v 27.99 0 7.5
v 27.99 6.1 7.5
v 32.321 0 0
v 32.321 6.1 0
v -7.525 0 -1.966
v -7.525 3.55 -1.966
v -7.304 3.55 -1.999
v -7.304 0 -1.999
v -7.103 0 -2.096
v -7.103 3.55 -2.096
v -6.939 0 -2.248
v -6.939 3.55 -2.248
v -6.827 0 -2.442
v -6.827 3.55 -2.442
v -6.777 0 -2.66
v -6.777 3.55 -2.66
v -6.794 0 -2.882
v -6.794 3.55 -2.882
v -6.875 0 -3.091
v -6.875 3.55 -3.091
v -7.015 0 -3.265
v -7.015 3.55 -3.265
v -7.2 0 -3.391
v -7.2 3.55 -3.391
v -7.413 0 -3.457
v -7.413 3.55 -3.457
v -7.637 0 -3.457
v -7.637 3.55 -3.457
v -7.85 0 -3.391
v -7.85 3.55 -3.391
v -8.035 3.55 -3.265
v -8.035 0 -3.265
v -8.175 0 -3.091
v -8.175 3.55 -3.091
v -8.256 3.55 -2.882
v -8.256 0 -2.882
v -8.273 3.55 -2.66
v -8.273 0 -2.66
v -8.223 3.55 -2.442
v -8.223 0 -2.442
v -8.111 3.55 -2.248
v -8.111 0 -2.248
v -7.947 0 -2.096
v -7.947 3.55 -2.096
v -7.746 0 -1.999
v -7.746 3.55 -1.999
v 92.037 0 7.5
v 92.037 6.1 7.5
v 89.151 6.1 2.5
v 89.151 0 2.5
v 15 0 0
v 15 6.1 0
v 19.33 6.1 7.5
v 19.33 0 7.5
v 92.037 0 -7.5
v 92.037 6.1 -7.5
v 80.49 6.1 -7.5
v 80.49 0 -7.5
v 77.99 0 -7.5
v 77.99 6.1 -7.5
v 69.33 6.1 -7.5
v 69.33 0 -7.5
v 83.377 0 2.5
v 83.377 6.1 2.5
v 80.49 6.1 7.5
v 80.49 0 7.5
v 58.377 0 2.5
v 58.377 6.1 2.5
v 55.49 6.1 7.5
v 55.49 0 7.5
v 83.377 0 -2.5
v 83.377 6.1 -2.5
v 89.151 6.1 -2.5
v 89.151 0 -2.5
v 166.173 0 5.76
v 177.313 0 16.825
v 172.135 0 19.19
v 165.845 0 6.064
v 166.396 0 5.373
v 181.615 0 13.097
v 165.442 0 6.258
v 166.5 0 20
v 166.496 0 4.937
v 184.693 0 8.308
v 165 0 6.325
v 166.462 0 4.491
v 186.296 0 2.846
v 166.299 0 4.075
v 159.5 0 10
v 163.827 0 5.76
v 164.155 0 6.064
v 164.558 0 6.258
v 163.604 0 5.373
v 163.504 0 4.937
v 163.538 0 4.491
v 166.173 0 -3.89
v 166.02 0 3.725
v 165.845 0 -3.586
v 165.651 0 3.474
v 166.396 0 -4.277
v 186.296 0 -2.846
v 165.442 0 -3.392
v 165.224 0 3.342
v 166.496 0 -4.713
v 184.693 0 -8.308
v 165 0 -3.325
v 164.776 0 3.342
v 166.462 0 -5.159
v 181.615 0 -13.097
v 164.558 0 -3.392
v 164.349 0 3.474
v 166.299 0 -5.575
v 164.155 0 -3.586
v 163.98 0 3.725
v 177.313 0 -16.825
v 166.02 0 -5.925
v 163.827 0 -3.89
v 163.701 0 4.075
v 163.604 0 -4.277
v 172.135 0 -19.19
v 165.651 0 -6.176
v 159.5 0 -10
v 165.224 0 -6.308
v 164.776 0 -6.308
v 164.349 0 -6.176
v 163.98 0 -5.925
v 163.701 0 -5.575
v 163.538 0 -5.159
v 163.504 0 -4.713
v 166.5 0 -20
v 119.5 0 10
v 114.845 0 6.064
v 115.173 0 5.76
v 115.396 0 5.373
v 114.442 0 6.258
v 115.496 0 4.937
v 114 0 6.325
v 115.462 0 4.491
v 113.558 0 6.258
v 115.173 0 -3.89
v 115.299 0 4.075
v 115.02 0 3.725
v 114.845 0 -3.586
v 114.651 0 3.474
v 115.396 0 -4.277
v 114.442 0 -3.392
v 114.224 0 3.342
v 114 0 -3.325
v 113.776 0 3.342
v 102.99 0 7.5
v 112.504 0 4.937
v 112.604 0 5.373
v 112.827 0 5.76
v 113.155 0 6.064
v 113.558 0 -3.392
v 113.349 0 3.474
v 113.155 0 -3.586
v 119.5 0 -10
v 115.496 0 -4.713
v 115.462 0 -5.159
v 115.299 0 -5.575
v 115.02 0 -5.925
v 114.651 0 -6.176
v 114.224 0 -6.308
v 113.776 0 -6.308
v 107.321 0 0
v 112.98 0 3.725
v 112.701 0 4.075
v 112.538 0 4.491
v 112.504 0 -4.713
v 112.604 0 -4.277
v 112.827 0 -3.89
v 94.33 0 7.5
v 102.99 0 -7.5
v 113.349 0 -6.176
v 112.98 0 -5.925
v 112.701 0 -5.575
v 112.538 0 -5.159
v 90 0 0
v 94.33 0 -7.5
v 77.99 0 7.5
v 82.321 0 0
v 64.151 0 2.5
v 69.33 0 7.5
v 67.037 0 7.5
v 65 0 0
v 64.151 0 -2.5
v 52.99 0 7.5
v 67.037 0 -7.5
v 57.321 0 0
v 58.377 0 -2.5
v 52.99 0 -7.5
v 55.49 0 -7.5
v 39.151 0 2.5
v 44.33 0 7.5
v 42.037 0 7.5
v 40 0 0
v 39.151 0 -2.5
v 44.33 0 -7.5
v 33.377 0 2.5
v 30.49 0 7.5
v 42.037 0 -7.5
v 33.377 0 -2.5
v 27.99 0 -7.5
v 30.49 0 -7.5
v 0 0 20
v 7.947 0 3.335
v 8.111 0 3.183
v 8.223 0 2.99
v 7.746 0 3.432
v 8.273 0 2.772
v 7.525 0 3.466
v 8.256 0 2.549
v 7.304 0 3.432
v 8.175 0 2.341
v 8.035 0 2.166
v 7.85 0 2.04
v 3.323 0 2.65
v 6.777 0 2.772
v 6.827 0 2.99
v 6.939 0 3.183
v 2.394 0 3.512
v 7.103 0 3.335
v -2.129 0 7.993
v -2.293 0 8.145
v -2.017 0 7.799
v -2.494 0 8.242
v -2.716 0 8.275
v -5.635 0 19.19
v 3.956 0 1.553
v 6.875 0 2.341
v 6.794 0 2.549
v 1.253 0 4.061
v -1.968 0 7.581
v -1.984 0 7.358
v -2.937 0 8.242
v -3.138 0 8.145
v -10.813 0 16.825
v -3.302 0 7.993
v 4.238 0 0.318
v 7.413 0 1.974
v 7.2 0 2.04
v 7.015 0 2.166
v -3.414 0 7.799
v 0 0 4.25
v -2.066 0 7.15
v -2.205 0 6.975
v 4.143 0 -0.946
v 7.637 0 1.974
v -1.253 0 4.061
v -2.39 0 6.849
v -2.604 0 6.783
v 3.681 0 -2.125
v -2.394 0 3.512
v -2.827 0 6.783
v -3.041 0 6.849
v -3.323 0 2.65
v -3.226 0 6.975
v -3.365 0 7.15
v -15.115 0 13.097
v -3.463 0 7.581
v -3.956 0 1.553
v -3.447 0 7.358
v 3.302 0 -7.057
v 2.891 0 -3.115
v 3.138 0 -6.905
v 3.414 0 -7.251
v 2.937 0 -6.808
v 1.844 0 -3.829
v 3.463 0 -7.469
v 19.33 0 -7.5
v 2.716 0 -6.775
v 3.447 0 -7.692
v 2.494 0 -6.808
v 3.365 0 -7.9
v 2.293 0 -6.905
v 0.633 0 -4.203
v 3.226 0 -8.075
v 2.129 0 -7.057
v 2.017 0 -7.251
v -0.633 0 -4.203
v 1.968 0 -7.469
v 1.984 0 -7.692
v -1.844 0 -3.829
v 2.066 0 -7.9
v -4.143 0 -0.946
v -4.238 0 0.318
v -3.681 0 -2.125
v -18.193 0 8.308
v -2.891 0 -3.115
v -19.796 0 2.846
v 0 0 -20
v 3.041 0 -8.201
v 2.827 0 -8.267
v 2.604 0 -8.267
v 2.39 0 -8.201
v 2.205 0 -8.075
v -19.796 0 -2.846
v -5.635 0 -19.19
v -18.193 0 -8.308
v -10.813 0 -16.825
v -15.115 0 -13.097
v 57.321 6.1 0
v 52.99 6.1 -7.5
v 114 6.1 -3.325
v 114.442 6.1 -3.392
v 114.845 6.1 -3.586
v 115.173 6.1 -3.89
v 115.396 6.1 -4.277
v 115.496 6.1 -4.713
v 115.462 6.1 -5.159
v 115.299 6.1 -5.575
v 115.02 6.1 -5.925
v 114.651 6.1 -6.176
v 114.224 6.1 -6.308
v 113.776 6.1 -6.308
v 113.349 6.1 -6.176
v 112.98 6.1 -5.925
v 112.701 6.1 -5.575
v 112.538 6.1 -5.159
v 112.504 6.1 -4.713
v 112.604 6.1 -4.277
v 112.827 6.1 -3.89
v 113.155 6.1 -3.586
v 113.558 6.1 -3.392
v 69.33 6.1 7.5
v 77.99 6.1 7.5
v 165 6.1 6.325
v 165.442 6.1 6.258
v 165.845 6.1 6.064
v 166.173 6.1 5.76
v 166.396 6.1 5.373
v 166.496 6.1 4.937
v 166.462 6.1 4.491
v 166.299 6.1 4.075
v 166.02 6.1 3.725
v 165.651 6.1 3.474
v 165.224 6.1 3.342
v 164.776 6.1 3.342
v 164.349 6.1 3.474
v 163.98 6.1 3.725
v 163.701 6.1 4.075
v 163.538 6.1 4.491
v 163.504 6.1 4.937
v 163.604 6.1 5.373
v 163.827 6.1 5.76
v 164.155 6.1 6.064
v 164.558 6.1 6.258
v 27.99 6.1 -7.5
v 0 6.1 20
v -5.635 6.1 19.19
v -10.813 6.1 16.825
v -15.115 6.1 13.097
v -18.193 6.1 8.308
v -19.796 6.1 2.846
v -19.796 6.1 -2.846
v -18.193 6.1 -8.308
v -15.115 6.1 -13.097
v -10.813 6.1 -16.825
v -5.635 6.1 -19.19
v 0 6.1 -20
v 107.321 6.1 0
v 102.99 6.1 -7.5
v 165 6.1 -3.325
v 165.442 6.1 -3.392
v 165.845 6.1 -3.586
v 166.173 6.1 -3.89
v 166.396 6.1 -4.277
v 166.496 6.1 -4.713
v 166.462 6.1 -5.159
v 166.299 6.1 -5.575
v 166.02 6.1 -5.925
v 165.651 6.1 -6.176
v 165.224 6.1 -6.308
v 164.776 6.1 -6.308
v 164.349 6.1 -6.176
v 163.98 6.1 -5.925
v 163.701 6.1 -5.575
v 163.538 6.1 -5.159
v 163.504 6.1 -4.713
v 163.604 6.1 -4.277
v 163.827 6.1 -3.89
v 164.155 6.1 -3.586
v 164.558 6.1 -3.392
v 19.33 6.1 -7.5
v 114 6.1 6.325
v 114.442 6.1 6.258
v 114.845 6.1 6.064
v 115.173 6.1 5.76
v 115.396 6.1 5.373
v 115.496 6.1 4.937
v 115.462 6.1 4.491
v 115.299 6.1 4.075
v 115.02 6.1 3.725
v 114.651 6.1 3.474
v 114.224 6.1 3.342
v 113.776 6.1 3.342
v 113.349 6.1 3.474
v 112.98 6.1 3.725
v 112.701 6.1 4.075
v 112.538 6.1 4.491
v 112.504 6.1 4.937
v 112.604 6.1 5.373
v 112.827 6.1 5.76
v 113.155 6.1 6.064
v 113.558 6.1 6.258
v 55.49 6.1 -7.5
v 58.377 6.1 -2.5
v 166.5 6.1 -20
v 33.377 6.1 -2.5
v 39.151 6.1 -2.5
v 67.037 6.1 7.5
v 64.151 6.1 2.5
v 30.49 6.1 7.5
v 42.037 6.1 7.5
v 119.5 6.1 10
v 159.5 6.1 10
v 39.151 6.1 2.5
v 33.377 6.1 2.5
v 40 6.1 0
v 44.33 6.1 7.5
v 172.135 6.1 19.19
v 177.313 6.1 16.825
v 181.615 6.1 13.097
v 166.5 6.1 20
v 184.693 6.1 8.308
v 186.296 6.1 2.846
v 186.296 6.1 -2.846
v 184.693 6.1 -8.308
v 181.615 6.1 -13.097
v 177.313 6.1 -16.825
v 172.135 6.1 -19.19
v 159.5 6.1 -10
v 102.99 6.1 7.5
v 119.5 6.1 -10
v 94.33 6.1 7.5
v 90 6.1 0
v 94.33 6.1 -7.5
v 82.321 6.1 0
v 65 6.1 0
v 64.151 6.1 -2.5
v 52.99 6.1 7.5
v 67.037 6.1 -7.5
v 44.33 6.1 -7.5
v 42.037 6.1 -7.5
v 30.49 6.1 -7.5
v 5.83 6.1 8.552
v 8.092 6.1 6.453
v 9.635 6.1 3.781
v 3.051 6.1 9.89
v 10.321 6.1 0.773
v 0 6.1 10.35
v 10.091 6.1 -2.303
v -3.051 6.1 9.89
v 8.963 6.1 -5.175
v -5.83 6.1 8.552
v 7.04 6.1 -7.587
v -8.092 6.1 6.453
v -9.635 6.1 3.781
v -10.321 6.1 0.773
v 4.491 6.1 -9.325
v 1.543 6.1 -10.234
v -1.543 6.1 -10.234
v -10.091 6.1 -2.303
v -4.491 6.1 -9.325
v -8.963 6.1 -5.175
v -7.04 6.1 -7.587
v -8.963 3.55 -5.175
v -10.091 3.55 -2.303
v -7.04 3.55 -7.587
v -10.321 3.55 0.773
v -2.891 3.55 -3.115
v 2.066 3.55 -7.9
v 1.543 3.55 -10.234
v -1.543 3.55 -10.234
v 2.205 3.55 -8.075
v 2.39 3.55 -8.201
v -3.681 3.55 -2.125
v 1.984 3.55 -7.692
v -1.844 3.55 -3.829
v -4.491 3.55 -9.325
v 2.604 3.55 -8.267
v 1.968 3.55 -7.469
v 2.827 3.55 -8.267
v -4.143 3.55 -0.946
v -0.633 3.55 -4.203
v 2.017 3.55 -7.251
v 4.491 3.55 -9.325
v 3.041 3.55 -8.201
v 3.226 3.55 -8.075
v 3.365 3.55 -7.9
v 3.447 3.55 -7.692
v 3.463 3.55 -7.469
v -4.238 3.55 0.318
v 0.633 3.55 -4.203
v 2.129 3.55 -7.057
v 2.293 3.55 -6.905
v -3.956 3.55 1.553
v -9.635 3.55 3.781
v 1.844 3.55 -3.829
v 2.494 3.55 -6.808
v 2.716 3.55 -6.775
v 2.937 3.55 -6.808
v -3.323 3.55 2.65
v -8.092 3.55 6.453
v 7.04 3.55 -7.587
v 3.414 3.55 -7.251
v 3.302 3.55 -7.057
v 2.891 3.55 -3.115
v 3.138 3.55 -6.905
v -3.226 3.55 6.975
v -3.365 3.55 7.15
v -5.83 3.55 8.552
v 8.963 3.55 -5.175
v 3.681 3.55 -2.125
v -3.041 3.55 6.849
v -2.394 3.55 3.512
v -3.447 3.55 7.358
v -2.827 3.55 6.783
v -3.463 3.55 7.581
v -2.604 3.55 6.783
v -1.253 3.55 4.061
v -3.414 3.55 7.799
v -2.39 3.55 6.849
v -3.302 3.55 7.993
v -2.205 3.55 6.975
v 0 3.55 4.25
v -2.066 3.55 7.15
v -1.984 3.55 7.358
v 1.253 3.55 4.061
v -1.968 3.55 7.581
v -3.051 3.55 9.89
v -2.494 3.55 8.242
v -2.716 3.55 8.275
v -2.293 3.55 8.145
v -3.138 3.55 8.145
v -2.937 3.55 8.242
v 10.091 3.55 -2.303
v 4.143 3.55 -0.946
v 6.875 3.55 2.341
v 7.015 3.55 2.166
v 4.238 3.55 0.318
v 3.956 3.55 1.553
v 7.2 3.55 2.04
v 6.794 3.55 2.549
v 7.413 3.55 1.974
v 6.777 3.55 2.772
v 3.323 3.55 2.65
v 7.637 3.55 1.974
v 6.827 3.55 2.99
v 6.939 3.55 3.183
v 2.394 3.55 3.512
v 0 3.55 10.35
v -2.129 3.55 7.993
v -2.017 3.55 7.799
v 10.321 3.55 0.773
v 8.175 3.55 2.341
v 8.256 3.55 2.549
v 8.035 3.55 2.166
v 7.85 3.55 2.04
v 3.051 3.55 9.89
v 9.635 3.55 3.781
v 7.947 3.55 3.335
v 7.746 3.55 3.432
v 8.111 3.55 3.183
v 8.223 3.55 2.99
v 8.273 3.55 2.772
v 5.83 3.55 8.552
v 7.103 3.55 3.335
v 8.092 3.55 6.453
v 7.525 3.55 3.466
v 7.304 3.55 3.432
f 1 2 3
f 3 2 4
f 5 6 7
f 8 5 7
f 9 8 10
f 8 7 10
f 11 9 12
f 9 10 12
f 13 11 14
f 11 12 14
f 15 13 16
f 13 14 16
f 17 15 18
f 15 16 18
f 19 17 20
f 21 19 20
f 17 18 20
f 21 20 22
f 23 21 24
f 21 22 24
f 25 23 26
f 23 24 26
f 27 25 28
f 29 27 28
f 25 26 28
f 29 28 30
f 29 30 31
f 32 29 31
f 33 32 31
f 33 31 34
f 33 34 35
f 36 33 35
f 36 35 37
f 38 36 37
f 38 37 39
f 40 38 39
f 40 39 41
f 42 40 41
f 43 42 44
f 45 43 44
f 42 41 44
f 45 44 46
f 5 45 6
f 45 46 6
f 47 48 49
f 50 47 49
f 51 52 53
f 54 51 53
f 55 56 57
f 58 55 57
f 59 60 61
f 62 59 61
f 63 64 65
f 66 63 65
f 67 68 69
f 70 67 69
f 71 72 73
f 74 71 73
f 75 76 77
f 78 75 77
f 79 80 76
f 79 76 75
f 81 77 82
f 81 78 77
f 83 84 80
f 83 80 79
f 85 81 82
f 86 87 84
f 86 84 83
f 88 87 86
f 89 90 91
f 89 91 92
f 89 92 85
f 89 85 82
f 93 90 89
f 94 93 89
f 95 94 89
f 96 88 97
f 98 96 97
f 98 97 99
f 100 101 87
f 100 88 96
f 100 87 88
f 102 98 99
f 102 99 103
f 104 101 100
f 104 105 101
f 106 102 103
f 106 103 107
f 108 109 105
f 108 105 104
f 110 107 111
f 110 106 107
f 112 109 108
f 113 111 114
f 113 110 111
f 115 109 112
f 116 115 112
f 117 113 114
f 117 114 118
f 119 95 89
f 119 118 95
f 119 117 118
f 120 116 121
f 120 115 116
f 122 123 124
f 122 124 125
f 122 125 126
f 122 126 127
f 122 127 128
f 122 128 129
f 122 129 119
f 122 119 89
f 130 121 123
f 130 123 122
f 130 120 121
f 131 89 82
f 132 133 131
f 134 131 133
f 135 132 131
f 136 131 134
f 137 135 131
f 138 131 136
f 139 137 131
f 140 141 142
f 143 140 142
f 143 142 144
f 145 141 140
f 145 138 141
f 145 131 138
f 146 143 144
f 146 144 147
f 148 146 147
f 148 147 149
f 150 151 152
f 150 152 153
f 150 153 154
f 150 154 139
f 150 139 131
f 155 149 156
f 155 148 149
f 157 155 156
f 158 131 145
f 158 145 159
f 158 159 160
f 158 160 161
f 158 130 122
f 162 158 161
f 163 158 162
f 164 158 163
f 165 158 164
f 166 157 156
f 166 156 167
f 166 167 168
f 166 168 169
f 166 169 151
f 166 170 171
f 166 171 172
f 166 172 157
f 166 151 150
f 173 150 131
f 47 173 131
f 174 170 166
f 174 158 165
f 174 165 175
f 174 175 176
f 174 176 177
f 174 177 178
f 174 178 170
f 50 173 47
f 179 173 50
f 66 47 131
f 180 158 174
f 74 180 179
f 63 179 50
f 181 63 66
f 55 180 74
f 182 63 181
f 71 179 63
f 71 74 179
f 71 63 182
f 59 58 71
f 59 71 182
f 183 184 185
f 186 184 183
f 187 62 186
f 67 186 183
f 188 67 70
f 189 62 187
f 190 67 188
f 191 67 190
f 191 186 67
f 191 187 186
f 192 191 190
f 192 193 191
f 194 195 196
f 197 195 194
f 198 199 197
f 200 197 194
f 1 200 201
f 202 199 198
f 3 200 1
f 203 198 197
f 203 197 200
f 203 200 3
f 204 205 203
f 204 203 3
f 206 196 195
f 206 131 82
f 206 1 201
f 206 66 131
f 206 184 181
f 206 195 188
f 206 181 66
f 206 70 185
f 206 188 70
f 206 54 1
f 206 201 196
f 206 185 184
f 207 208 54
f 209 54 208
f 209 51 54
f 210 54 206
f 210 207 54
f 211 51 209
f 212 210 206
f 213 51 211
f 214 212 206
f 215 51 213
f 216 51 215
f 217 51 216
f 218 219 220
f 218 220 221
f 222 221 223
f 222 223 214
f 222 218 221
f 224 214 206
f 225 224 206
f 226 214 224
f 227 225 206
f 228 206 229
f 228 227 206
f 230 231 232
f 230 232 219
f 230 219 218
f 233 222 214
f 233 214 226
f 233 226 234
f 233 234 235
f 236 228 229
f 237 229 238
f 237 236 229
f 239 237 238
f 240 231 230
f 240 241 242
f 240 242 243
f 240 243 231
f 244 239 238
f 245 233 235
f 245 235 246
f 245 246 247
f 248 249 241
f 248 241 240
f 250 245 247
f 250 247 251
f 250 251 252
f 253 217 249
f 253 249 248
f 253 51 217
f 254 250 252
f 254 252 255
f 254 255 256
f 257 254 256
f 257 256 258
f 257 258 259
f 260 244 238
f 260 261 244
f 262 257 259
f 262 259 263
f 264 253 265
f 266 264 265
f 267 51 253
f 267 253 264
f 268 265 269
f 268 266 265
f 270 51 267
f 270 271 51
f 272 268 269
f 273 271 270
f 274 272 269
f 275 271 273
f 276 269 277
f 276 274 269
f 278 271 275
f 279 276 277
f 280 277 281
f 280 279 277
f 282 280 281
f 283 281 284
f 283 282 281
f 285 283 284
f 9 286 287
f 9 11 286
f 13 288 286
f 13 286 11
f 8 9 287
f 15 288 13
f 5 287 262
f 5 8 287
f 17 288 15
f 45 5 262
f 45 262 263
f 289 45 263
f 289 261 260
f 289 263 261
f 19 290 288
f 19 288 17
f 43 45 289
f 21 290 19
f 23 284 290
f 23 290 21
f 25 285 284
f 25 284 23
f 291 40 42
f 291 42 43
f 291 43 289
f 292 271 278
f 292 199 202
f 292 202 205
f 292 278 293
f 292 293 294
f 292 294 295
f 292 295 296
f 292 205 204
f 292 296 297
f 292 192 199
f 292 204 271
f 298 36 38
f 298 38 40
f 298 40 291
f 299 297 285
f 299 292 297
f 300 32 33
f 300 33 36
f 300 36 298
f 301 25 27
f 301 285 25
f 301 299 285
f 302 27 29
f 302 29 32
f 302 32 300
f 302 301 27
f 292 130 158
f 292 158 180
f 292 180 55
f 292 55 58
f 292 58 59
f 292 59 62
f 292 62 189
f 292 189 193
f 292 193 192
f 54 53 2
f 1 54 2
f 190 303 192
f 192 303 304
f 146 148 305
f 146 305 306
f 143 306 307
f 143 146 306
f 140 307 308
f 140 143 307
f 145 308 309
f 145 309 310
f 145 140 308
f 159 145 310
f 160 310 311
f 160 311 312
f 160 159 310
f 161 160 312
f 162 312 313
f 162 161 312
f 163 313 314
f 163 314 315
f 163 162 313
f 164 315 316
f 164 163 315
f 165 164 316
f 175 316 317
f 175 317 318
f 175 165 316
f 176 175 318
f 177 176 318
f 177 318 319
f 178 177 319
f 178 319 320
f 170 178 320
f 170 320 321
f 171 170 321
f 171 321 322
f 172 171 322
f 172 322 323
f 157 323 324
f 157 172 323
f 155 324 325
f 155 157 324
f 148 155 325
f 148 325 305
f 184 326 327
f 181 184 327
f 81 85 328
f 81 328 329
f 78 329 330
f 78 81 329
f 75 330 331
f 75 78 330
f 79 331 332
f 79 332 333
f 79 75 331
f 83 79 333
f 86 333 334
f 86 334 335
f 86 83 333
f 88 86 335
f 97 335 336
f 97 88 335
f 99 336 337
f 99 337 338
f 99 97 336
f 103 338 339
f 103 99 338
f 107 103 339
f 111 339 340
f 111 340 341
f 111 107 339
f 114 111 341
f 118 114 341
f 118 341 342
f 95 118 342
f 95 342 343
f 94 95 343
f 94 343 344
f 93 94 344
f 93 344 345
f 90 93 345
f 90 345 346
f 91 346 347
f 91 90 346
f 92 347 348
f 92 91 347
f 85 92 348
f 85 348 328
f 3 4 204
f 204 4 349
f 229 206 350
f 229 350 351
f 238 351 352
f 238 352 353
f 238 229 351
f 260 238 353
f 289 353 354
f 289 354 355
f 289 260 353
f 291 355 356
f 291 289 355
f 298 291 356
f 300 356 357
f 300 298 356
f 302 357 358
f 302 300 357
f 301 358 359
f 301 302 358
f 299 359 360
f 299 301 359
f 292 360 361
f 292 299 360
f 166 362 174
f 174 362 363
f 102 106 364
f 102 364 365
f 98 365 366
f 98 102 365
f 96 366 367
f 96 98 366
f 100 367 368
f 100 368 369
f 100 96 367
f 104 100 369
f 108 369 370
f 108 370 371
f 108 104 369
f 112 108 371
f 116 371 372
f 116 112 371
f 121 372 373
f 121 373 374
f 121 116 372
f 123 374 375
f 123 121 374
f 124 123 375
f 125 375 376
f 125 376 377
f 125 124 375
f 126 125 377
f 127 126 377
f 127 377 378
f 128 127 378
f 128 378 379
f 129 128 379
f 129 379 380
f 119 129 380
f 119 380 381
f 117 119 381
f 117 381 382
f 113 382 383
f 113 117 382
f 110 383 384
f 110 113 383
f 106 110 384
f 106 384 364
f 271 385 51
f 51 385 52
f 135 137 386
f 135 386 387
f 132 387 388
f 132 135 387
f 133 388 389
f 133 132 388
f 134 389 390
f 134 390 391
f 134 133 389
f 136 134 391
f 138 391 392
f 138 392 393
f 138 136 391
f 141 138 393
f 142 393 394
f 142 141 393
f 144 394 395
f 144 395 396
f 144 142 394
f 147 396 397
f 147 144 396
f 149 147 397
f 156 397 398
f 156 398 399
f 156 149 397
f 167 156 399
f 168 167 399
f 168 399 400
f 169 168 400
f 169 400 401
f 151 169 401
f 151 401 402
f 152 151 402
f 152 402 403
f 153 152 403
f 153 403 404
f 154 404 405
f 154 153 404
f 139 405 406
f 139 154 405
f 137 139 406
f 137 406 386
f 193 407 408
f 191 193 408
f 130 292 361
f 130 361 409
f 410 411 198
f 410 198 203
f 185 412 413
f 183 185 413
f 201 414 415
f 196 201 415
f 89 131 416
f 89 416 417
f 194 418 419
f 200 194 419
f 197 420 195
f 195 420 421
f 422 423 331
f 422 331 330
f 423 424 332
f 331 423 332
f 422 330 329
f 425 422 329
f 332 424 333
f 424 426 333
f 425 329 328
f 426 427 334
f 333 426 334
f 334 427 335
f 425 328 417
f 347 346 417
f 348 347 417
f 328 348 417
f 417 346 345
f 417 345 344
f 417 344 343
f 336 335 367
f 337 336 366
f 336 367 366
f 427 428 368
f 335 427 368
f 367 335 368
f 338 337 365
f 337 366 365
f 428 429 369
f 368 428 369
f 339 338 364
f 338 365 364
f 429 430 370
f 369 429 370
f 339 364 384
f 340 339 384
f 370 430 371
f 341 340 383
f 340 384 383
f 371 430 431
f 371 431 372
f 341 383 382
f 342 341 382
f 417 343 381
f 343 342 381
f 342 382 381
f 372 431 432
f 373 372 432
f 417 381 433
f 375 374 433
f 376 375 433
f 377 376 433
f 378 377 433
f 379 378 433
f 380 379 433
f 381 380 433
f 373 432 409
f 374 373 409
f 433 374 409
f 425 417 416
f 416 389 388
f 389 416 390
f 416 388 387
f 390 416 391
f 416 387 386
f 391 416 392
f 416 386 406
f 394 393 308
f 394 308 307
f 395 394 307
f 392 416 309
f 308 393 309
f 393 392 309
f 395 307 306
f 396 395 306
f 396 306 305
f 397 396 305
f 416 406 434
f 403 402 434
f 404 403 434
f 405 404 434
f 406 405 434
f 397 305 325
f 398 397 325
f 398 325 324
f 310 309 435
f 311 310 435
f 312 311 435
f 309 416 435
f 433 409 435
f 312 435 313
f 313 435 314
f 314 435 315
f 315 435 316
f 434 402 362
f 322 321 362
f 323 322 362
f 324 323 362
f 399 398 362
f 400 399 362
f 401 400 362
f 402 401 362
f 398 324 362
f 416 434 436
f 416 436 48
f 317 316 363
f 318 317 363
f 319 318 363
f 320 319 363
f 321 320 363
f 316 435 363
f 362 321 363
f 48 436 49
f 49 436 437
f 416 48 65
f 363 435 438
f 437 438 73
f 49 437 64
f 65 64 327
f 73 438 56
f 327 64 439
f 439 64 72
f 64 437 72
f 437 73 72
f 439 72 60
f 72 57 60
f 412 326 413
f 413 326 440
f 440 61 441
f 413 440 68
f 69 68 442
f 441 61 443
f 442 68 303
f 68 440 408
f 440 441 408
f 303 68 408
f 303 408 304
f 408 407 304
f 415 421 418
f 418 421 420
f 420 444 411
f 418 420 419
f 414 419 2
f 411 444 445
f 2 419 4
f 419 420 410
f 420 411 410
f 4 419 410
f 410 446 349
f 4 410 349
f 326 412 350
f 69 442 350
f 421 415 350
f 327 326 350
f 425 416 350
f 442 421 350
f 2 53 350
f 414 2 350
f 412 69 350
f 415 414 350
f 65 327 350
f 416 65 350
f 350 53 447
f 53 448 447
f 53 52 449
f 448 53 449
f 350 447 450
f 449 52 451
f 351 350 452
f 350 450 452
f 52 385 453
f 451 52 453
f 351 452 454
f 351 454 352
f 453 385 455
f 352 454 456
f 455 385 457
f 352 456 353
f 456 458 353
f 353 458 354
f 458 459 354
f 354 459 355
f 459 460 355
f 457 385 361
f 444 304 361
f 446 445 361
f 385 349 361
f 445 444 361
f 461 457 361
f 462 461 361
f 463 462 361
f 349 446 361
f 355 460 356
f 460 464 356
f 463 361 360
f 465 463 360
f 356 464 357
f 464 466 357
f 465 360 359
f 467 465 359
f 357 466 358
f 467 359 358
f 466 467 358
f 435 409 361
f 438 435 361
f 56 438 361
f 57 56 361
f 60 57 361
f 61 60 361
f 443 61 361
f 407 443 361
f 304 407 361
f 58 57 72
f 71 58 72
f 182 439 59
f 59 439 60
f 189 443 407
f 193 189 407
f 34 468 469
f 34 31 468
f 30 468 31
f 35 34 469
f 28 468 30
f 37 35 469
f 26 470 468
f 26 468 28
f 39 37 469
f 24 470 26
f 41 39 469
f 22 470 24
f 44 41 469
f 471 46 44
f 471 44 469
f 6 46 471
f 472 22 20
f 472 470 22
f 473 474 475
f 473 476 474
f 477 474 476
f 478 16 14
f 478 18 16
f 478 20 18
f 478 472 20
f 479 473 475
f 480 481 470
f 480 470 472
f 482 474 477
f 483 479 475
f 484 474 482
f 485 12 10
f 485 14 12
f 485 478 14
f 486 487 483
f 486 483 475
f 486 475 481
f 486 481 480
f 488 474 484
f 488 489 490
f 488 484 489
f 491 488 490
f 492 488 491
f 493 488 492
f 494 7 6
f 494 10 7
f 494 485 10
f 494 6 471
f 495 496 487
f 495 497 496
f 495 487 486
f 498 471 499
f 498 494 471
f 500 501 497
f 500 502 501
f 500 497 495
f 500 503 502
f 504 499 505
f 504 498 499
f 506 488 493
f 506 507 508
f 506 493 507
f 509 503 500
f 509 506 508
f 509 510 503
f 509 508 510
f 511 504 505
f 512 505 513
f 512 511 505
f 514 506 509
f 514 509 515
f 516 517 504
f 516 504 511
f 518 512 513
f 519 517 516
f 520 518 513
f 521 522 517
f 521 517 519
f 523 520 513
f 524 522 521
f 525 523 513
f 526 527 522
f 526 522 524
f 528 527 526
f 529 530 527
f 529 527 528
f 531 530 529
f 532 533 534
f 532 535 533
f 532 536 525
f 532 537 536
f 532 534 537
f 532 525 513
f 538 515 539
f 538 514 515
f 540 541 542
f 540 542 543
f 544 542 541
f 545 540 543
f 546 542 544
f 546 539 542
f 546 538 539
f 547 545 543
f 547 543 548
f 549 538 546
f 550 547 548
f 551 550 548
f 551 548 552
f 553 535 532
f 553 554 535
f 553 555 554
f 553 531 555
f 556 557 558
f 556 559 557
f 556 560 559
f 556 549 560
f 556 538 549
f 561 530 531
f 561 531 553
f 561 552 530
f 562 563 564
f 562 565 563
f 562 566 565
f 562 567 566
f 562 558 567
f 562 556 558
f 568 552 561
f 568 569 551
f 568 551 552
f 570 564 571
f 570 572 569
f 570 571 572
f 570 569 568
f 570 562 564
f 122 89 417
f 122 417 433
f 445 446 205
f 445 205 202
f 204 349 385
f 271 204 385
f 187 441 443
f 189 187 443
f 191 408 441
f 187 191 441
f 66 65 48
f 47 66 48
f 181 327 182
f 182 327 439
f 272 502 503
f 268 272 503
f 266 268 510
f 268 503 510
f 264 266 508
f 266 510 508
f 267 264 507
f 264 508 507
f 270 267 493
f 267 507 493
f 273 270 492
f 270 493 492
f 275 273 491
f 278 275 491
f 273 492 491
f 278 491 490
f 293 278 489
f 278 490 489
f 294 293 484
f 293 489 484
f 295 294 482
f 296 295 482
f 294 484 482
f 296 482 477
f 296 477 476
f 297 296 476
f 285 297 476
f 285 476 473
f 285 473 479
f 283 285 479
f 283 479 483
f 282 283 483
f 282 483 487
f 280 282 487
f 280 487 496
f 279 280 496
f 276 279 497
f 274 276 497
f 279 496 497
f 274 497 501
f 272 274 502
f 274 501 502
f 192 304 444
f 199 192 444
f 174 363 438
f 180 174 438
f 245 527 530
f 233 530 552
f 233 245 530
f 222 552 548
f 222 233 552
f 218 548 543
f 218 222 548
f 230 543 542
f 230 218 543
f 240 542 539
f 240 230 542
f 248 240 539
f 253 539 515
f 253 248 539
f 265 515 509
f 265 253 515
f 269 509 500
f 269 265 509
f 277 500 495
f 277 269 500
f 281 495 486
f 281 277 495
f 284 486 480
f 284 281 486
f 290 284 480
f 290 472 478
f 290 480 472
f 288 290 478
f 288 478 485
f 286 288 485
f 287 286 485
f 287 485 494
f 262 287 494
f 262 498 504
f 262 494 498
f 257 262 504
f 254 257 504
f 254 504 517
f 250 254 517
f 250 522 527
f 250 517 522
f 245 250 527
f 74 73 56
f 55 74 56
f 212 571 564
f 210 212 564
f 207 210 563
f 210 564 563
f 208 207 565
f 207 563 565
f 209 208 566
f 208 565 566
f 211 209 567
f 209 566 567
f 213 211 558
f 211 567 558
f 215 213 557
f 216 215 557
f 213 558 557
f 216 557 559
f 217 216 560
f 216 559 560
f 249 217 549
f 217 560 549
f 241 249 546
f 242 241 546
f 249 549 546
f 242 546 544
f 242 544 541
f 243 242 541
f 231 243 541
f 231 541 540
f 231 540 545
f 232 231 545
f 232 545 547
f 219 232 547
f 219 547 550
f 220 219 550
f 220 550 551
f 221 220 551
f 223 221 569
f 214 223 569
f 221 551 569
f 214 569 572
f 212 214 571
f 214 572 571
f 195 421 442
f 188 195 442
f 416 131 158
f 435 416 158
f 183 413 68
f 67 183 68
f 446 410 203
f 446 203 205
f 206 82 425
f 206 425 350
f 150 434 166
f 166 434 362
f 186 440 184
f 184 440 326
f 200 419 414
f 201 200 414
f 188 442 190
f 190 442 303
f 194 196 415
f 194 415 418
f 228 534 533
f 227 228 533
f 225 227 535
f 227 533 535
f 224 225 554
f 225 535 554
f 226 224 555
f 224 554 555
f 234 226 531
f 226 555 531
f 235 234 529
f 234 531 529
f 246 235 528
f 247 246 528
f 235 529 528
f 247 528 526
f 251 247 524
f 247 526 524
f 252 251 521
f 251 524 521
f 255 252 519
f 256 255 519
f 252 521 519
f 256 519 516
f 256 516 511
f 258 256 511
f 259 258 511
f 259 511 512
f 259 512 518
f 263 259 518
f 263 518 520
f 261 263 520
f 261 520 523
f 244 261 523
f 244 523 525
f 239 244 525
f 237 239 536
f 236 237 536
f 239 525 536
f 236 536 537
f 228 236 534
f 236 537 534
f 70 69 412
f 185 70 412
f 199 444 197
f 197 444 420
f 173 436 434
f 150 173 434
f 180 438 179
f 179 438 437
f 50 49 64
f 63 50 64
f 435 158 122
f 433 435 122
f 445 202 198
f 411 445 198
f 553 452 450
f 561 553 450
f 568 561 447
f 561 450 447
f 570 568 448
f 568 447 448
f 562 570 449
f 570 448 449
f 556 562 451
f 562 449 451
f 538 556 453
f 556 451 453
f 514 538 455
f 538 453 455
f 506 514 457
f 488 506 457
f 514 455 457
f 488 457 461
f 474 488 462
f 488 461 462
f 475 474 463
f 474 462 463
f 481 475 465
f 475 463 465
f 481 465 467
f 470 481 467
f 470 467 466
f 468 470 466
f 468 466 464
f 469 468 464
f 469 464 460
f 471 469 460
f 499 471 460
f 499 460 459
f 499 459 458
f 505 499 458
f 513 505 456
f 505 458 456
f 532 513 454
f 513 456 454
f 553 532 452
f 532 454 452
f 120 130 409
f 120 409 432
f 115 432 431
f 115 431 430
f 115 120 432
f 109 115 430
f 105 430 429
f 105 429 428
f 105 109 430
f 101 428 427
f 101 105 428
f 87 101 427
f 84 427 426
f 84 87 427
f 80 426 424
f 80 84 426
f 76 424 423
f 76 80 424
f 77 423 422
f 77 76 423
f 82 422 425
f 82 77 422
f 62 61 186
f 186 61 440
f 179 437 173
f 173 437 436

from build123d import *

# Parameters (mm, degrees)
SKETCH1_R           = 4.25
SKETCH1_R_2         = 1.5
SKETCH1_W           = 40
SKETCH1_H           = 20
BOSS_EXTRUDE1_DEPTH = 6.1
SKETCH2_R           = 10.35
CUT_EXTRUDE1_DEPTH  = 2.55
SKETCH3_R           = 0.75
CUT_EXTRUDE3_DEPTH  = 3.55
CUT_EXTRUDE4_DEPTH  = 6.1


with BuildPart() as part:
    # Sketch1 → Boss-Extrude1 (new body)
    with BuildSketch(Plane(origin=(0, 0, 0), x_dir=(1, 0, 0), z_dir=(0, 1, 0))):
        with BuildLine():
            Line((150, 20), (159.5, 20))
            Line((159.5, 20), (166.5, 20))
            ThreePointArc((166.5, 20), (186.5, 0), (166.5, -20))
            Line((166.5, -20), (159.5, -20))
            Line((159.5, -20), (150, -20))
            Line((150, -20), (0, -20))
            ThreePointArc((0, -20), (-20, 0), (0, 20))
            Line((0, 20), (150, 20))
        make_face()
        with Locations(Location((0, 0, 0), (0, 0, 270))):
            Circle(SKETCH1_R, mode=Mode.SUBTRACT)
        with Locations(Location((165, 4.825, 0), (0, 0, 270))):
            Circle(SKETCH1_R_2, mode=Mode.SUBTRACT)
        with Locations(Location((165, -4.825, 0), (0, 0, 270))):
            Circle(SKETCH1_R_2, mode=Mode.SUBTRACT)
        with Locations(Location((114, 4.825, 0), (0, 0, 270))):
            Circle(SKETCH1_R_2, mode=Mode.SUBTRACT)
        with Locations(Location((114, -4.825, 0), (0, 0, 270))):
            Circle(SKETCH1_R_2, mode=Mode.SUBTRACT)
        with Locations((139.5, 0)):
            Rectangle(SKETCH1_W, SKETCH1_H, mode=Mode.SUBTRACT)
    extrude(amount=BOSS_EXTRUDE1_DEPTH)

    # Sketch2 → Cut-Extrude1 (cut)
    with BuildSketch(Plane(origin=(0, 6.1, 0), x_dir=(1, 0, 0), z_dir=(0, 1, 0))):
        with Locations(Location((0, 0, 0), (0, 0, 270))):
            Circle(SKETCH2_R)
    extrude(amount=-CUT_EXTRUDE1_DEPTH, mode=Mode.SUBTRACT)

    # Sketch3 → Cut-Extrude3 (cut)
    with BuildSketch(Plane(origin=(0, 3.55, 0), x_dir=(1, 0, 0), z_dir=(0, 1, 0))):
        with Locations(Location((-7.52500865, 2.715556079, 0), (0, 0, 270))):
            Circle(SKETCH3_R)
        with Locations(Location((7.52500865, -2.715556079, 0), (0, 0, 270))):
            Circle(SKETCH3_R)
        with Locations(Location((2.715556079, 7.52500865, 0), (0, 0, 270))):
            Circle(SKETCH3_R)
        with Locations(Location((-2.715556079, -7.52500865, 0), (0, 0, 270))):
            Circle(SKETCH3_R)
    extrude(amount=-CUT_EXTRUDE3_DEPTH, mode=Mode.SUBTRACT)

    # Sketch4 → Cut-Extrude4 (cut)
    with BuildSketch(Plane(origin=(0, 6.1, 0), x_dir=(1, 0, 0), z_dir=(0, 1, 0))):
        Polygon((32.320508076, 0), (27.990381057, 7.5), (19.330127019, 7.5), (15, 0), (19.330127019, -7.5), (27.990381057, -7.5), align=None)
        Polygon((57.320508076, 0), (52.990381057, 7.5), (44.330127019, 7.5), (40, 0), (44.330127019, -7.5), (52.990381057, -7.5), align=None)
        Polygon((82.320508076, 0), (77.990381057, 7.5), (69.330127019, 7.5), (65, 0), (69.330127019, -7.5), (77.990381057, -7.5), align=None)
        Polygon((107.320508076, 0), (102.990381057, 7.5), (94.330127019, 7.5), (90, 0), (94.330127019, -7.5), (102.990381057, -7.5), align=None)
        Polygon((30.490381057, 7.5), (42.037386441, 7.5), (39.150635095, 2.5), (33.377132403, 2.5), align=None)
        Polygon((64.150635095, 2.5), (67.037386441, 7.5), (55.490381057, 7.5), (58.377132403, 2.5), align=None)
        Polygon((89.150635095, 2.5), (92.037386441, 7.5), (80.490381057, 7.5), (83.377132403, 2.5), align=None)
        Polygon((30.490381057, -7.5), (42.037386441, -7.5), (39.150635095, -2.5), (33.377132403, -2.5), align=None)
        Polygon((55.490381057, -7.5), (67.037386441, -7.5), (64.150635095, -2.5), (58.377132403, -2.5), align=None)
        Polygon((80.490381057, -7.5), (92.037386441, -7.5), (89.150635095, -2.5), (83.377132403, -2.5), align=None)
    extrude(amount=-CUT_EXTRUDE4_DEPTH, mode=Mode.SUBTRACT)


solid = part.part
